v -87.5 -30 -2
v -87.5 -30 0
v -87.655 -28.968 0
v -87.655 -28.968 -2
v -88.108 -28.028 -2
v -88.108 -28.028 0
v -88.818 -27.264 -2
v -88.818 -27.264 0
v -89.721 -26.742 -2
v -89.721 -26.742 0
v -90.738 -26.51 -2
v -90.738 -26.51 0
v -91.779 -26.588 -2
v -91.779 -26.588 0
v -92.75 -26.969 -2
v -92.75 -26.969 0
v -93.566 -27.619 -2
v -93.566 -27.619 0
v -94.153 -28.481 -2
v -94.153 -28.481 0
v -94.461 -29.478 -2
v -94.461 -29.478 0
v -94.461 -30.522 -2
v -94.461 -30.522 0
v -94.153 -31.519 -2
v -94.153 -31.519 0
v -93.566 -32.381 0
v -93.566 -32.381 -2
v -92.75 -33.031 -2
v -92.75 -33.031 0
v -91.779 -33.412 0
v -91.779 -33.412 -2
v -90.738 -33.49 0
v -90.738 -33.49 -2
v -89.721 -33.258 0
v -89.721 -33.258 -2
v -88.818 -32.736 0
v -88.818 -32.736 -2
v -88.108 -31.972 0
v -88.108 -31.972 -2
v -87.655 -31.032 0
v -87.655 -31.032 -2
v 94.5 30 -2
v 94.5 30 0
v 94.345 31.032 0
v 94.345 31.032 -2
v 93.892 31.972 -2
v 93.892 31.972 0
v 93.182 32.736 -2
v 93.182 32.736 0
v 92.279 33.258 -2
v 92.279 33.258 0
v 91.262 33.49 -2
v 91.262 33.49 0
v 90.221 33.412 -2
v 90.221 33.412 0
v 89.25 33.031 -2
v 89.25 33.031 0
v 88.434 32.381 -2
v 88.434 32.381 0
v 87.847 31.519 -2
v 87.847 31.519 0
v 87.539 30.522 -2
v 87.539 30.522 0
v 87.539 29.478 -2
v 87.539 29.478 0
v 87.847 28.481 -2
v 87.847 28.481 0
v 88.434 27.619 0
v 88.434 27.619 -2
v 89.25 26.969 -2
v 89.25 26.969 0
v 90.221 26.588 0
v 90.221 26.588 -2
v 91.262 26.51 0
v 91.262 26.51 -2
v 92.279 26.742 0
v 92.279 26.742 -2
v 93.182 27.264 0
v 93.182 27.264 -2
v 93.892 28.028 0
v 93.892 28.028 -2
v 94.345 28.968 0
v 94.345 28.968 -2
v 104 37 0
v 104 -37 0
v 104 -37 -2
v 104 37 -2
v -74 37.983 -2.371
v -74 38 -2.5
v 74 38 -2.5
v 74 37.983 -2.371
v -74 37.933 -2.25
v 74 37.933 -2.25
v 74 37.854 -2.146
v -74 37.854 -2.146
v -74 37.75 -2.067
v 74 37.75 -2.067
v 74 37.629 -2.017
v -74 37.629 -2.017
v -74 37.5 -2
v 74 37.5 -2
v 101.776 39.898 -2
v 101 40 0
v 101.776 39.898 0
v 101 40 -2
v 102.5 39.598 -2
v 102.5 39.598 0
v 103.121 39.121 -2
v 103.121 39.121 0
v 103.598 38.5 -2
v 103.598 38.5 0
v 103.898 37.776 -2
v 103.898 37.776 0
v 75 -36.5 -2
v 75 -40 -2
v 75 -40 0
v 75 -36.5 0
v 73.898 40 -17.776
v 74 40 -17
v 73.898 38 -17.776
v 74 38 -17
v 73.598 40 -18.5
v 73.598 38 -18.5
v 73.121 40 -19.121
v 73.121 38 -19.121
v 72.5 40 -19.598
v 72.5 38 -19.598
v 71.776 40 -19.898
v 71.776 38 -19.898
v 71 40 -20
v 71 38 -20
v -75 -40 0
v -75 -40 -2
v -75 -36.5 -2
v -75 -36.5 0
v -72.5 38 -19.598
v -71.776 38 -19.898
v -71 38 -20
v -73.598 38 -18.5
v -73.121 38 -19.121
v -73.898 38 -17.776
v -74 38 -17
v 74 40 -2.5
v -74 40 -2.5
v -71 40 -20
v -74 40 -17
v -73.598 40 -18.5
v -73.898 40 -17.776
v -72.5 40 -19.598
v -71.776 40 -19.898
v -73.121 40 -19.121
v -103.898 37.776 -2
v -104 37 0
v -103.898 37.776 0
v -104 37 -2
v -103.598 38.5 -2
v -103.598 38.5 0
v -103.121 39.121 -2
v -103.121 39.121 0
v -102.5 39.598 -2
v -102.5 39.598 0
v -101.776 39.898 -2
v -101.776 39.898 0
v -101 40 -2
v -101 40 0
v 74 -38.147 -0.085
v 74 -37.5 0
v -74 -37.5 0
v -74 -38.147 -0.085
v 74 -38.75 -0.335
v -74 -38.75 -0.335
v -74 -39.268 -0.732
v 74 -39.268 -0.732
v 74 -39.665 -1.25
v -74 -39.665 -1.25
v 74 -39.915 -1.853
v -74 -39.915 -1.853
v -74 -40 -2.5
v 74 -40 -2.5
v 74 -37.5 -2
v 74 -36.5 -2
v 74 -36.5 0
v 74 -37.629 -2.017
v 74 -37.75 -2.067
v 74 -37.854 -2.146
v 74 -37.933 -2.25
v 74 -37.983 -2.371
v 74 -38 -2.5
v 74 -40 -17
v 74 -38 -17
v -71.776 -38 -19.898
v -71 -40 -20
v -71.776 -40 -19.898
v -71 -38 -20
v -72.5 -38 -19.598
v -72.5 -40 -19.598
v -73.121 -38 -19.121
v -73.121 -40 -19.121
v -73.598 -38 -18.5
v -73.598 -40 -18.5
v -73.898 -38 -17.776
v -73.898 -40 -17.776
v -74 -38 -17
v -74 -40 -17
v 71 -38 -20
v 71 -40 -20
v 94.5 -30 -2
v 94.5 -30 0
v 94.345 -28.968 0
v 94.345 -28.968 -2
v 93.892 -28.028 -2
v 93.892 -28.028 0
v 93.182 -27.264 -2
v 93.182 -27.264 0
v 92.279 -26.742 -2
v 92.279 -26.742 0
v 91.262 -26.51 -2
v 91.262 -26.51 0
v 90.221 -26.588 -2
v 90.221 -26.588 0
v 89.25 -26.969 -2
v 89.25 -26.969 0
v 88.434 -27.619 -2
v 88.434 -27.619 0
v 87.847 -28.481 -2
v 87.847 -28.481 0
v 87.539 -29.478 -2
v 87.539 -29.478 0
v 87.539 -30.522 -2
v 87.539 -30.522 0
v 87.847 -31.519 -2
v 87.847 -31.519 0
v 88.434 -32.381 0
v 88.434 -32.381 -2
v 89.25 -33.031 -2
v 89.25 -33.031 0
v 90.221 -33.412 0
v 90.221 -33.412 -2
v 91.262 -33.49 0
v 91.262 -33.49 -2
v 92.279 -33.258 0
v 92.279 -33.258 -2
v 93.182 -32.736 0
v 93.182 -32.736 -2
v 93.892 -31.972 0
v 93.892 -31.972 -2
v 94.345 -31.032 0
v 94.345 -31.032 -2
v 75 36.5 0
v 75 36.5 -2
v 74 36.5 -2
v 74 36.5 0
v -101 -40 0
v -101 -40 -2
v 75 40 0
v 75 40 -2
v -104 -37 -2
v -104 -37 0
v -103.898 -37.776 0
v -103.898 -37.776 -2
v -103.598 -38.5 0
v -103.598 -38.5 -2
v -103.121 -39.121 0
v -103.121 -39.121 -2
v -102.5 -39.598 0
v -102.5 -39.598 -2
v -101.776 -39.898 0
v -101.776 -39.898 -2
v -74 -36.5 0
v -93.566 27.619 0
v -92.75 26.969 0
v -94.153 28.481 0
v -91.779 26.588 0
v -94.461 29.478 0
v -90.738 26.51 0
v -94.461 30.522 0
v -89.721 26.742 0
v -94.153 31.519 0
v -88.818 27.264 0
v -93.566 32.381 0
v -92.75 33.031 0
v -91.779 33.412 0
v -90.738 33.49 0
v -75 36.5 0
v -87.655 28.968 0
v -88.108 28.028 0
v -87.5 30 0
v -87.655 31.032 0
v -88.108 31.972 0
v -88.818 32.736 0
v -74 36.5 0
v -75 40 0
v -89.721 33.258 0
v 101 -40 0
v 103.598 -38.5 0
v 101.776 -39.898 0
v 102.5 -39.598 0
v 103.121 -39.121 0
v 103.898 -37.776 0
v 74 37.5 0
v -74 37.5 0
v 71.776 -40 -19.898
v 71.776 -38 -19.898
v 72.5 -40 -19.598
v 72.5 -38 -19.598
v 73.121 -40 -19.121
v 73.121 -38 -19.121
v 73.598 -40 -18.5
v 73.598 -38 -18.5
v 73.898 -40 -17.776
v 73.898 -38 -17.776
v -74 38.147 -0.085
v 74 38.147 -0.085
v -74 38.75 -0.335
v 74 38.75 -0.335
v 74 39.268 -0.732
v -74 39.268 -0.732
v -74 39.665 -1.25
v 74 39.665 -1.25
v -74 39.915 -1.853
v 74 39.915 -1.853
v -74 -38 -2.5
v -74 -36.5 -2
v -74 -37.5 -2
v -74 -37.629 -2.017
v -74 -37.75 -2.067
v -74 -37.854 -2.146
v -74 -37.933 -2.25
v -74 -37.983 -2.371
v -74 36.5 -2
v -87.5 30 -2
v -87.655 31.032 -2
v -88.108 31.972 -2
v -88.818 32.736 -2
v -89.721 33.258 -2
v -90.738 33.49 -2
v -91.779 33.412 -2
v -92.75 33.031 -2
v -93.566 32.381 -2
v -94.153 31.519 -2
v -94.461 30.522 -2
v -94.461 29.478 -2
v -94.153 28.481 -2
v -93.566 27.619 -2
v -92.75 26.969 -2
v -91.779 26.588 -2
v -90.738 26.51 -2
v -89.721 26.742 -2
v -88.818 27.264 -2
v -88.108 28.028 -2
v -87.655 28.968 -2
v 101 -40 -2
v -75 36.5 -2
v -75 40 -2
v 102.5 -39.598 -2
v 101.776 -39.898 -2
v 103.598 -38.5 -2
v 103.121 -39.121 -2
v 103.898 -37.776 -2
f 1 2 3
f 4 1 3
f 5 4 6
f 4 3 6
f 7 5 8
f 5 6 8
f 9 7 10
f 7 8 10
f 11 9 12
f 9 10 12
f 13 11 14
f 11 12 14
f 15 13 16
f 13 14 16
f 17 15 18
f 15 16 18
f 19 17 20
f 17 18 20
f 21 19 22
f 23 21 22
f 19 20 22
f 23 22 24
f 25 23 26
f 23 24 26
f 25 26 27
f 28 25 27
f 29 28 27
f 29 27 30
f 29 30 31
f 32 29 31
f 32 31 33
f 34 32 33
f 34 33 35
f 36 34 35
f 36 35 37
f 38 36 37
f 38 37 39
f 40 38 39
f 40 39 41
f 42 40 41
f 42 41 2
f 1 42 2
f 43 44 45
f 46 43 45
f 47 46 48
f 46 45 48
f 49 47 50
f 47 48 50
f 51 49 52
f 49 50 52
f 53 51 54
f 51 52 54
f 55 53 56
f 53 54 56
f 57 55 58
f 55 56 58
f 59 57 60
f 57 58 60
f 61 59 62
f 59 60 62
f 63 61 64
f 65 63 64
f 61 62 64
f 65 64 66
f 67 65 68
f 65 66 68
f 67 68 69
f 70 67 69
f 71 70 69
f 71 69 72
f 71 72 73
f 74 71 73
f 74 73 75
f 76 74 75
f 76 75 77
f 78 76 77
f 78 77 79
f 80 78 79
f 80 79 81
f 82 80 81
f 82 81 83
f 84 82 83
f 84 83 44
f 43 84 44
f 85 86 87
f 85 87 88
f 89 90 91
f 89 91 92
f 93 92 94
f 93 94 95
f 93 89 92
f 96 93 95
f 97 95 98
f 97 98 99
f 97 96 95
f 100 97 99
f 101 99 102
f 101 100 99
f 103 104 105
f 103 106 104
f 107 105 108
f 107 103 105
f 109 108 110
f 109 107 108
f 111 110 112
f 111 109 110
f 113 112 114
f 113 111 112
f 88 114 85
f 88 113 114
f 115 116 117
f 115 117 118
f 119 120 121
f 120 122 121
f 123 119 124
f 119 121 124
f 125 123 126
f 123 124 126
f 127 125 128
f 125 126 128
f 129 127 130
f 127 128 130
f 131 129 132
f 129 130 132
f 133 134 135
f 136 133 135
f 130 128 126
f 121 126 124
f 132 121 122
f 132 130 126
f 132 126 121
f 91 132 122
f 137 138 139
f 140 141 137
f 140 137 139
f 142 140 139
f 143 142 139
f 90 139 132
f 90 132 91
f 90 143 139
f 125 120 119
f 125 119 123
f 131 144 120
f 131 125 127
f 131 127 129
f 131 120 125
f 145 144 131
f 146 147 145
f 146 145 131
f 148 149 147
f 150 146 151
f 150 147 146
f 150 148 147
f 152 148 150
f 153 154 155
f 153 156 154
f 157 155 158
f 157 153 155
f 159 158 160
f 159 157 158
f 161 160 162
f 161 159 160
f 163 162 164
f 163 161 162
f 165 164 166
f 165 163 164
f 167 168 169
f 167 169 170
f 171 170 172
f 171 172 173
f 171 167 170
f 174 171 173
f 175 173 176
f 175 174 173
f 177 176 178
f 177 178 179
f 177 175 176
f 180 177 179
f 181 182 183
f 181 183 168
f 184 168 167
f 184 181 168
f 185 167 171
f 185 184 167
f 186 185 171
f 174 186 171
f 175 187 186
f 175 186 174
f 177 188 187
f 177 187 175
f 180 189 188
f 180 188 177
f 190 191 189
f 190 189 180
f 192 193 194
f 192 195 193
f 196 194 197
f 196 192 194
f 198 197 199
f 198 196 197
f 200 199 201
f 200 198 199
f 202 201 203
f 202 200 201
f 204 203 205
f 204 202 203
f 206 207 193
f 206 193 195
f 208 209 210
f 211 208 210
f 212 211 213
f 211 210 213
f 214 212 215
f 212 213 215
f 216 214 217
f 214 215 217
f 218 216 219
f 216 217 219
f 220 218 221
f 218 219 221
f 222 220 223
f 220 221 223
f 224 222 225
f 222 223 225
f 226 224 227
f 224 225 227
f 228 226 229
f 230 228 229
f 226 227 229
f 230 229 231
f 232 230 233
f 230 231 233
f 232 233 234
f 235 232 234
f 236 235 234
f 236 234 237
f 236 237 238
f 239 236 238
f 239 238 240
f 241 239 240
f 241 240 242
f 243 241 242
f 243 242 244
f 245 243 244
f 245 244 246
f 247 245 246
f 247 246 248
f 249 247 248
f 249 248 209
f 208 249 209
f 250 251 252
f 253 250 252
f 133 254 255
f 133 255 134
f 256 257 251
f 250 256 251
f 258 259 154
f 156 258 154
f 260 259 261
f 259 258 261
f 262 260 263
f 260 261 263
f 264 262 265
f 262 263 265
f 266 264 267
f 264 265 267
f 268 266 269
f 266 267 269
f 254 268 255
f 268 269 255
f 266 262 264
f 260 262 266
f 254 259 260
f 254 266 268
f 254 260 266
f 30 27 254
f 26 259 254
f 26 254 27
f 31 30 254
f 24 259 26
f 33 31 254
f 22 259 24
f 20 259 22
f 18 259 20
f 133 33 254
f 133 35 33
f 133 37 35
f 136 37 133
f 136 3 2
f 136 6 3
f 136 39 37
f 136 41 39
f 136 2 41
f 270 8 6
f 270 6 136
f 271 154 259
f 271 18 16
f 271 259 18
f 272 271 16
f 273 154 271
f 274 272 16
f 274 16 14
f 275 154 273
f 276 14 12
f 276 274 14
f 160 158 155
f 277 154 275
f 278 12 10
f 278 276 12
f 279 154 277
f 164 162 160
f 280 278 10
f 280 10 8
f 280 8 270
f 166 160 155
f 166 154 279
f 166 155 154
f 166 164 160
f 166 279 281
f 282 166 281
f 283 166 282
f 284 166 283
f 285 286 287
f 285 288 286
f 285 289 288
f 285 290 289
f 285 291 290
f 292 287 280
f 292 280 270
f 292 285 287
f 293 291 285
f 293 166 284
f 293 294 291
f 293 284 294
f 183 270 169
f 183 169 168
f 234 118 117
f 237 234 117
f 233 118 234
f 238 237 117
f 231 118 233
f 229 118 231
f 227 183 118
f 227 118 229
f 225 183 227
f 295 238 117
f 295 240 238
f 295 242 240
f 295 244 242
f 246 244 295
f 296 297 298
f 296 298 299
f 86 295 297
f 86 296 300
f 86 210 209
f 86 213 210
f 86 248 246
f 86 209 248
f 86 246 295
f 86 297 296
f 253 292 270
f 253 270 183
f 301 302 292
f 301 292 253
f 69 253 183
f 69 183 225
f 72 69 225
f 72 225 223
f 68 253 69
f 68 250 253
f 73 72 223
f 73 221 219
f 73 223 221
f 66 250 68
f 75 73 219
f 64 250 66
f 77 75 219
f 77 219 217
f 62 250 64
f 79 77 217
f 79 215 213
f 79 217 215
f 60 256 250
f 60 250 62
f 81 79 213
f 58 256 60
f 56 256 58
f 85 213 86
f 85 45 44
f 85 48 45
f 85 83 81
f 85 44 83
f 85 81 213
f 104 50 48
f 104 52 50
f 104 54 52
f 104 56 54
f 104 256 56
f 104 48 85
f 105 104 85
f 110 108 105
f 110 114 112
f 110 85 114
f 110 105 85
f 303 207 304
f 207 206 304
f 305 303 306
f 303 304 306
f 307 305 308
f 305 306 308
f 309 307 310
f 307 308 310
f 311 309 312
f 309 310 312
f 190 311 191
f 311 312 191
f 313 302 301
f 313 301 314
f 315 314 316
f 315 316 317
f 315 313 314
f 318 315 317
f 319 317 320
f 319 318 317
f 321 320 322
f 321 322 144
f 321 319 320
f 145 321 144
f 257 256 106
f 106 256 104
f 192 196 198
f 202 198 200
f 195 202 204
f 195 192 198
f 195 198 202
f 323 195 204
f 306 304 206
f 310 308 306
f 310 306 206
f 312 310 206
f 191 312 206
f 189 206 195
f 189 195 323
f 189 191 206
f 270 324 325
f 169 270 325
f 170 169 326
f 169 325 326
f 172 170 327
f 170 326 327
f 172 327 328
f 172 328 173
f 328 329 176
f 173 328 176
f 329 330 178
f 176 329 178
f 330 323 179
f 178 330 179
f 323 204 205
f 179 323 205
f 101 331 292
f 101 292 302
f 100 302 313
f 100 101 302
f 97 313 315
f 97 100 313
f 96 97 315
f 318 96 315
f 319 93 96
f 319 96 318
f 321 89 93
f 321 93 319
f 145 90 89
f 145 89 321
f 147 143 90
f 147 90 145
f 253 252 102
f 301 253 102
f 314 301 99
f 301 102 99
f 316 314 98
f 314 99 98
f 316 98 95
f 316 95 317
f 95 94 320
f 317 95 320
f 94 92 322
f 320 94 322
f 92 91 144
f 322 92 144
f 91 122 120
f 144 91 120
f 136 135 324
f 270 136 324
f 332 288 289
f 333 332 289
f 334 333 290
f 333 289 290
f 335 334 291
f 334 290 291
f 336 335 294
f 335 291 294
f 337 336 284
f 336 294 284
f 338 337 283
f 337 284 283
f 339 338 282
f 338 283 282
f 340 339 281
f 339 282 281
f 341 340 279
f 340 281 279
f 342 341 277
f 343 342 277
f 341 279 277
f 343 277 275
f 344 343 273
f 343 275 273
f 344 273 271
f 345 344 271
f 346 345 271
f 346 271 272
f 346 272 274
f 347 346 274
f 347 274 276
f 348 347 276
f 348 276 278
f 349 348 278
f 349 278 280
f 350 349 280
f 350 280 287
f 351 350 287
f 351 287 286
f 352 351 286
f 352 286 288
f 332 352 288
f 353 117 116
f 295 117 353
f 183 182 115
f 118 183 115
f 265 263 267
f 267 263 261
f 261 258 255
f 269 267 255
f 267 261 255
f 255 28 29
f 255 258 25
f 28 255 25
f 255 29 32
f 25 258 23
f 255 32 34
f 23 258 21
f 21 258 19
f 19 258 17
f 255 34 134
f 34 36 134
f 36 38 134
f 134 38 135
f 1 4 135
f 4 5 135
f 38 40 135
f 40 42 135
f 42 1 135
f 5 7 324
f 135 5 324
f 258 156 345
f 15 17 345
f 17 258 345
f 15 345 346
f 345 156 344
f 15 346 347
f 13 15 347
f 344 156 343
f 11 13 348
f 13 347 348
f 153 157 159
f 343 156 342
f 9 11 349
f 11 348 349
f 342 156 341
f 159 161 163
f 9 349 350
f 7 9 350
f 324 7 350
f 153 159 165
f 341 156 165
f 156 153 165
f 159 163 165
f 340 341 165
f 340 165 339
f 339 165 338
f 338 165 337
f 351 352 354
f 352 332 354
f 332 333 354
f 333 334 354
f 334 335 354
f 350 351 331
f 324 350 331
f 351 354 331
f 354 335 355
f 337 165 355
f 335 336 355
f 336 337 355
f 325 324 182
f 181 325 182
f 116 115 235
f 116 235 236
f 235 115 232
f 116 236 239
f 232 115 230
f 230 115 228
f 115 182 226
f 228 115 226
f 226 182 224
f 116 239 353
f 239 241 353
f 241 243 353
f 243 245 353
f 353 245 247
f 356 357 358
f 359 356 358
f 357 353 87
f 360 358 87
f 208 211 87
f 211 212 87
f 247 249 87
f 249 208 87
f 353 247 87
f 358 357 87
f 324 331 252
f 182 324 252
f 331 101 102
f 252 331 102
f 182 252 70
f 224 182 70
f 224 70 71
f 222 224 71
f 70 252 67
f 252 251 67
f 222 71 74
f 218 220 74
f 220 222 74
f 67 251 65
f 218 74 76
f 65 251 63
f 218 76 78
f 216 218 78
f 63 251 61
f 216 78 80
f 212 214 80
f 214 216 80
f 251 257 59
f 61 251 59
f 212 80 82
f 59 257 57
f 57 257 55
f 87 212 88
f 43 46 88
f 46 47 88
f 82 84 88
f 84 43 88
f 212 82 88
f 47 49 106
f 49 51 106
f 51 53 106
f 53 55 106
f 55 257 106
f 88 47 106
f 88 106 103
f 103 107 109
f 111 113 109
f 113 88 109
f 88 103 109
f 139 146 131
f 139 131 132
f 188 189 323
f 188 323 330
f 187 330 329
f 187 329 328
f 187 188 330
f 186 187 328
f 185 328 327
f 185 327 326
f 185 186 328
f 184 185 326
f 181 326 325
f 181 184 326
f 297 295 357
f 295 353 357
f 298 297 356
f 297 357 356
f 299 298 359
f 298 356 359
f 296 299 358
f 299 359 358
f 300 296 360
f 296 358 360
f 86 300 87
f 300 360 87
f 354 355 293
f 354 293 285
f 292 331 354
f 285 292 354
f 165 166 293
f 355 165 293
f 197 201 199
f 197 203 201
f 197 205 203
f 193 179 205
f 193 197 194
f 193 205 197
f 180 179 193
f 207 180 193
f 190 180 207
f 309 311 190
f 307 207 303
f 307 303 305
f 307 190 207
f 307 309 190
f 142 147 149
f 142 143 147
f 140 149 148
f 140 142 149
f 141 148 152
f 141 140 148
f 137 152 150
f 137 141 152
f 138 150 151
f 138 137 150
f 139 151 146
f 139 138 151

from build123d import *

# Parameters (mm, degrees)
SKETCH_1_W                        = 208
SKETCH_1_H                        = 80
SM_BASE_FLANGE_1_DEPTH            = 2
SM_EDGE_FLANGE_1_STRIP_W          = 9
SM_EDGE_FLANGE_1_STRIP_H          = 2
SM_EDGE_FLANGE_1_STRIP_CUT_DEPTH  = 148
SM_EDGE_FLANGE_1_RELIEF_W         = 10
SM_EDGE_FLANGE_1_RELIEF_H         = 1
SM_EDGE_FLANGE_1_RELIEF_CUT_DEPTH = 2
SM_EDGE_FLANGE_1_DEPTH            = 148
SM_EDGE_FLANGE_2_STRIP_W          = 9
SM_EDGE_FLANGE_2_STRIP_H          = 2
SM_EDGE_FLANGE_2_STRIP_CUT_DEPTH  = 148
SM_EDGE_FLANGE_2_RELIEF_W         = 10
SM_EDGE_FLANGE_2_RELIEF_H         = 1
SM_EDGE_FLANGE_2_RELIEF_CUT_DEPTH = 2
SM_EDGE_FLANGE_2_DEPTH            = 148
SKETCH_10_R                       = 3.5
CUT_EXTRUDE_1_DEPTH               = 114.207773585
FILLET_1_R                        = 3


# Sheet-metal steps are written as plain solids
with BuildPart() as part:
    # Sketch 1 → 基体-法兰1 (new body)
    with BuildSketch(Plane.XY):
        Rectangle(SKETCH_1_W, SKETCH_1_H)
    extrude(amount=-SM_BASE_FLANGE_1_DEPTH)

    # 边线-法兰1 strip (across the edge) → 边线-法兰1 strip cut (cut)
    with BuildSketch(Plane(origin=(-74, 40, -2), x_dir=(0, -1, 0), z_dir=(1, 0, 0))):
        with Locations((-2, -1)):
            Rectangle(SM_EDGE_FLANGE_1_STRIP_W, SM_EDGE_FLANGE_1_STRIP_H)
    extrude(amount=SM_EDGE_FLANGE_1_STRIP_CUT_DEPTH, mode=Mode.SUBTRACT)

    # 边线-法兰1 relief (on the sheet) → 边线-法兰1 relief cut (cut)
    with BuildSketch(Plane(origin=(-74, 37.5, -2), x_dir=(0, -1, 0), z_dir=(0, 0, -1))):
        with Locations((-4, 0.5)):
            Rectangle(SM_EDGE_FLANGE_1_RELIEF_W, SM_EDGE_FLANGE_1_RELIEF_H)
        with Locations((-4, -148.5)):
            Rectangle(SM_EDGE_FLANGE_1_RELIEF_W, SM_EDGE_FLANGE_1_RELIEF_H)
    extrude(amount=-SM_EDGE_FLANGE_1_RELIEF_CUT_DEPTH, mode=Mode.SUBTRACT)

    # 边线-法兰1 section (across the edge) → 边线-法兰1 (add)
    with BuildSketch(Plane(origin=(-74, 40, -2), x_dir=(0, -1, 0), z_dir=(1, 0, 0))):
        with BuildLine():
            Line((0, 0.5), (0, 18))
            Line((0, 18), (2, 18))
            Line((2, 18), (2, 0.5))
            ThreePointArc((2, 0.5), (2.146446609, 0.146446609), (2.5, 0))
            Line((2.5, 0), (2.5, -2))
            ThreePointArc((2.5, -2), (0.732233047, -1.267766953), (0, 0.5))
        make_face()
    extrude(amount=SM_EDGE_FLANGE_1_DEPTH)

    # 边线-法兰2 strip (across the edge) → 边线-法兰2 strip cut (cut)
    with BuildSketch(Plane(origin=(74, -40, -2), x_dir=(0, 1, 0), z_dir=(-1, 0, 0))):
        with Locations((-2, -1)):
            Rectangle(SM_EDGE_FLANGE_2_STRIP_W, SM_EDGE_FLANGE_2_STRIP_H)
    extrude(amount=SM_EDGE_FLANGE_2_STRIP_CUT_DEPTH, mode=Mode.SUBTRACT)

    # 边线-法兰2 relief (on the sheet) → 边线-法兰2 relief cut (cut)
    with BuildSketch(Plane(origin=(74, -37.5, -2), x_dir=(0, 1, 0), z_dir=(0, 0, -1))):
        with Locations((-4, 0.5)):
            Rectangle(SM_EDGE_FLANGE_2_RELIEF_W, SM_EDGE_FLANGE_2_RELIEF_H)
        with Locations((-4, -148.5)):
            Rectangle(SM_EDGE_FLANGE_2_RELIEF_W, SM_EDGE_FLANGE_2_RELIEF_H)
    extrude(amount=-SM_EDGE_FLANGE_2_RELIEF_CUT_DEPTH, mode=Mode.SUBTRACT)

    # 边线-法兰2 section (across the edge) → 边线-法兰2 (add)
    with BuildSketch(Plane(origin=(74, -40, -2), x_dir=(0, 1, 0), z_dir=(-1, 0, 0))):
        with BuildLine():
            Line((0, 0.5), (0, 18))
            Line((0, 18), (2, 18))
            Line((2, 18), (2, 0.5))
            ThreePointArc((2, 0.5), (2.146446609, 0.146446609), (2.5, 0))
            Line((2.5, 0), (2.5, -2))
            ThreePointArc((2.5, -2), (0.732233047, -1.267766953), (0, 0.5))
        make_face()
    extrude(amount=SM_EDGE_FLANGE_2_DEPTH)

    # 草图10 → 切除-拉伸1 (cut, through all)
    with BuildSketch(Plane.XY):
        with Locations((91, -30)):
            Circle(SKETCH_10_R)
        with Locations((91, 30)):
            Circle(SKETCH_10_R)
        with Locations((-91, -30)):
            Circle(SKETCH_10_R)
        with Locations((-91, 30)):
            Circle(SKETCH_10_R)
    extrude(amount=-CUT_EXTRUDE_1_DEPTH, mode=Mode.SUBTRACT)

    # 圆角1
    fillet_1_edges = [part.edges().sort_by_distance(p)[0] for p in [
        (-74, 39, -20),
        (74, 39, -20),
        (104, -40, -1),
        (-104, -40, -1),
        (-104, 40, -1),
        (104, 40, -1),
        (74, -39, -20),
        (-74, -39, -20),
    ]]
    fillet(fillet_1_edges, radius=FILLET_1_R)


solid = part.part
